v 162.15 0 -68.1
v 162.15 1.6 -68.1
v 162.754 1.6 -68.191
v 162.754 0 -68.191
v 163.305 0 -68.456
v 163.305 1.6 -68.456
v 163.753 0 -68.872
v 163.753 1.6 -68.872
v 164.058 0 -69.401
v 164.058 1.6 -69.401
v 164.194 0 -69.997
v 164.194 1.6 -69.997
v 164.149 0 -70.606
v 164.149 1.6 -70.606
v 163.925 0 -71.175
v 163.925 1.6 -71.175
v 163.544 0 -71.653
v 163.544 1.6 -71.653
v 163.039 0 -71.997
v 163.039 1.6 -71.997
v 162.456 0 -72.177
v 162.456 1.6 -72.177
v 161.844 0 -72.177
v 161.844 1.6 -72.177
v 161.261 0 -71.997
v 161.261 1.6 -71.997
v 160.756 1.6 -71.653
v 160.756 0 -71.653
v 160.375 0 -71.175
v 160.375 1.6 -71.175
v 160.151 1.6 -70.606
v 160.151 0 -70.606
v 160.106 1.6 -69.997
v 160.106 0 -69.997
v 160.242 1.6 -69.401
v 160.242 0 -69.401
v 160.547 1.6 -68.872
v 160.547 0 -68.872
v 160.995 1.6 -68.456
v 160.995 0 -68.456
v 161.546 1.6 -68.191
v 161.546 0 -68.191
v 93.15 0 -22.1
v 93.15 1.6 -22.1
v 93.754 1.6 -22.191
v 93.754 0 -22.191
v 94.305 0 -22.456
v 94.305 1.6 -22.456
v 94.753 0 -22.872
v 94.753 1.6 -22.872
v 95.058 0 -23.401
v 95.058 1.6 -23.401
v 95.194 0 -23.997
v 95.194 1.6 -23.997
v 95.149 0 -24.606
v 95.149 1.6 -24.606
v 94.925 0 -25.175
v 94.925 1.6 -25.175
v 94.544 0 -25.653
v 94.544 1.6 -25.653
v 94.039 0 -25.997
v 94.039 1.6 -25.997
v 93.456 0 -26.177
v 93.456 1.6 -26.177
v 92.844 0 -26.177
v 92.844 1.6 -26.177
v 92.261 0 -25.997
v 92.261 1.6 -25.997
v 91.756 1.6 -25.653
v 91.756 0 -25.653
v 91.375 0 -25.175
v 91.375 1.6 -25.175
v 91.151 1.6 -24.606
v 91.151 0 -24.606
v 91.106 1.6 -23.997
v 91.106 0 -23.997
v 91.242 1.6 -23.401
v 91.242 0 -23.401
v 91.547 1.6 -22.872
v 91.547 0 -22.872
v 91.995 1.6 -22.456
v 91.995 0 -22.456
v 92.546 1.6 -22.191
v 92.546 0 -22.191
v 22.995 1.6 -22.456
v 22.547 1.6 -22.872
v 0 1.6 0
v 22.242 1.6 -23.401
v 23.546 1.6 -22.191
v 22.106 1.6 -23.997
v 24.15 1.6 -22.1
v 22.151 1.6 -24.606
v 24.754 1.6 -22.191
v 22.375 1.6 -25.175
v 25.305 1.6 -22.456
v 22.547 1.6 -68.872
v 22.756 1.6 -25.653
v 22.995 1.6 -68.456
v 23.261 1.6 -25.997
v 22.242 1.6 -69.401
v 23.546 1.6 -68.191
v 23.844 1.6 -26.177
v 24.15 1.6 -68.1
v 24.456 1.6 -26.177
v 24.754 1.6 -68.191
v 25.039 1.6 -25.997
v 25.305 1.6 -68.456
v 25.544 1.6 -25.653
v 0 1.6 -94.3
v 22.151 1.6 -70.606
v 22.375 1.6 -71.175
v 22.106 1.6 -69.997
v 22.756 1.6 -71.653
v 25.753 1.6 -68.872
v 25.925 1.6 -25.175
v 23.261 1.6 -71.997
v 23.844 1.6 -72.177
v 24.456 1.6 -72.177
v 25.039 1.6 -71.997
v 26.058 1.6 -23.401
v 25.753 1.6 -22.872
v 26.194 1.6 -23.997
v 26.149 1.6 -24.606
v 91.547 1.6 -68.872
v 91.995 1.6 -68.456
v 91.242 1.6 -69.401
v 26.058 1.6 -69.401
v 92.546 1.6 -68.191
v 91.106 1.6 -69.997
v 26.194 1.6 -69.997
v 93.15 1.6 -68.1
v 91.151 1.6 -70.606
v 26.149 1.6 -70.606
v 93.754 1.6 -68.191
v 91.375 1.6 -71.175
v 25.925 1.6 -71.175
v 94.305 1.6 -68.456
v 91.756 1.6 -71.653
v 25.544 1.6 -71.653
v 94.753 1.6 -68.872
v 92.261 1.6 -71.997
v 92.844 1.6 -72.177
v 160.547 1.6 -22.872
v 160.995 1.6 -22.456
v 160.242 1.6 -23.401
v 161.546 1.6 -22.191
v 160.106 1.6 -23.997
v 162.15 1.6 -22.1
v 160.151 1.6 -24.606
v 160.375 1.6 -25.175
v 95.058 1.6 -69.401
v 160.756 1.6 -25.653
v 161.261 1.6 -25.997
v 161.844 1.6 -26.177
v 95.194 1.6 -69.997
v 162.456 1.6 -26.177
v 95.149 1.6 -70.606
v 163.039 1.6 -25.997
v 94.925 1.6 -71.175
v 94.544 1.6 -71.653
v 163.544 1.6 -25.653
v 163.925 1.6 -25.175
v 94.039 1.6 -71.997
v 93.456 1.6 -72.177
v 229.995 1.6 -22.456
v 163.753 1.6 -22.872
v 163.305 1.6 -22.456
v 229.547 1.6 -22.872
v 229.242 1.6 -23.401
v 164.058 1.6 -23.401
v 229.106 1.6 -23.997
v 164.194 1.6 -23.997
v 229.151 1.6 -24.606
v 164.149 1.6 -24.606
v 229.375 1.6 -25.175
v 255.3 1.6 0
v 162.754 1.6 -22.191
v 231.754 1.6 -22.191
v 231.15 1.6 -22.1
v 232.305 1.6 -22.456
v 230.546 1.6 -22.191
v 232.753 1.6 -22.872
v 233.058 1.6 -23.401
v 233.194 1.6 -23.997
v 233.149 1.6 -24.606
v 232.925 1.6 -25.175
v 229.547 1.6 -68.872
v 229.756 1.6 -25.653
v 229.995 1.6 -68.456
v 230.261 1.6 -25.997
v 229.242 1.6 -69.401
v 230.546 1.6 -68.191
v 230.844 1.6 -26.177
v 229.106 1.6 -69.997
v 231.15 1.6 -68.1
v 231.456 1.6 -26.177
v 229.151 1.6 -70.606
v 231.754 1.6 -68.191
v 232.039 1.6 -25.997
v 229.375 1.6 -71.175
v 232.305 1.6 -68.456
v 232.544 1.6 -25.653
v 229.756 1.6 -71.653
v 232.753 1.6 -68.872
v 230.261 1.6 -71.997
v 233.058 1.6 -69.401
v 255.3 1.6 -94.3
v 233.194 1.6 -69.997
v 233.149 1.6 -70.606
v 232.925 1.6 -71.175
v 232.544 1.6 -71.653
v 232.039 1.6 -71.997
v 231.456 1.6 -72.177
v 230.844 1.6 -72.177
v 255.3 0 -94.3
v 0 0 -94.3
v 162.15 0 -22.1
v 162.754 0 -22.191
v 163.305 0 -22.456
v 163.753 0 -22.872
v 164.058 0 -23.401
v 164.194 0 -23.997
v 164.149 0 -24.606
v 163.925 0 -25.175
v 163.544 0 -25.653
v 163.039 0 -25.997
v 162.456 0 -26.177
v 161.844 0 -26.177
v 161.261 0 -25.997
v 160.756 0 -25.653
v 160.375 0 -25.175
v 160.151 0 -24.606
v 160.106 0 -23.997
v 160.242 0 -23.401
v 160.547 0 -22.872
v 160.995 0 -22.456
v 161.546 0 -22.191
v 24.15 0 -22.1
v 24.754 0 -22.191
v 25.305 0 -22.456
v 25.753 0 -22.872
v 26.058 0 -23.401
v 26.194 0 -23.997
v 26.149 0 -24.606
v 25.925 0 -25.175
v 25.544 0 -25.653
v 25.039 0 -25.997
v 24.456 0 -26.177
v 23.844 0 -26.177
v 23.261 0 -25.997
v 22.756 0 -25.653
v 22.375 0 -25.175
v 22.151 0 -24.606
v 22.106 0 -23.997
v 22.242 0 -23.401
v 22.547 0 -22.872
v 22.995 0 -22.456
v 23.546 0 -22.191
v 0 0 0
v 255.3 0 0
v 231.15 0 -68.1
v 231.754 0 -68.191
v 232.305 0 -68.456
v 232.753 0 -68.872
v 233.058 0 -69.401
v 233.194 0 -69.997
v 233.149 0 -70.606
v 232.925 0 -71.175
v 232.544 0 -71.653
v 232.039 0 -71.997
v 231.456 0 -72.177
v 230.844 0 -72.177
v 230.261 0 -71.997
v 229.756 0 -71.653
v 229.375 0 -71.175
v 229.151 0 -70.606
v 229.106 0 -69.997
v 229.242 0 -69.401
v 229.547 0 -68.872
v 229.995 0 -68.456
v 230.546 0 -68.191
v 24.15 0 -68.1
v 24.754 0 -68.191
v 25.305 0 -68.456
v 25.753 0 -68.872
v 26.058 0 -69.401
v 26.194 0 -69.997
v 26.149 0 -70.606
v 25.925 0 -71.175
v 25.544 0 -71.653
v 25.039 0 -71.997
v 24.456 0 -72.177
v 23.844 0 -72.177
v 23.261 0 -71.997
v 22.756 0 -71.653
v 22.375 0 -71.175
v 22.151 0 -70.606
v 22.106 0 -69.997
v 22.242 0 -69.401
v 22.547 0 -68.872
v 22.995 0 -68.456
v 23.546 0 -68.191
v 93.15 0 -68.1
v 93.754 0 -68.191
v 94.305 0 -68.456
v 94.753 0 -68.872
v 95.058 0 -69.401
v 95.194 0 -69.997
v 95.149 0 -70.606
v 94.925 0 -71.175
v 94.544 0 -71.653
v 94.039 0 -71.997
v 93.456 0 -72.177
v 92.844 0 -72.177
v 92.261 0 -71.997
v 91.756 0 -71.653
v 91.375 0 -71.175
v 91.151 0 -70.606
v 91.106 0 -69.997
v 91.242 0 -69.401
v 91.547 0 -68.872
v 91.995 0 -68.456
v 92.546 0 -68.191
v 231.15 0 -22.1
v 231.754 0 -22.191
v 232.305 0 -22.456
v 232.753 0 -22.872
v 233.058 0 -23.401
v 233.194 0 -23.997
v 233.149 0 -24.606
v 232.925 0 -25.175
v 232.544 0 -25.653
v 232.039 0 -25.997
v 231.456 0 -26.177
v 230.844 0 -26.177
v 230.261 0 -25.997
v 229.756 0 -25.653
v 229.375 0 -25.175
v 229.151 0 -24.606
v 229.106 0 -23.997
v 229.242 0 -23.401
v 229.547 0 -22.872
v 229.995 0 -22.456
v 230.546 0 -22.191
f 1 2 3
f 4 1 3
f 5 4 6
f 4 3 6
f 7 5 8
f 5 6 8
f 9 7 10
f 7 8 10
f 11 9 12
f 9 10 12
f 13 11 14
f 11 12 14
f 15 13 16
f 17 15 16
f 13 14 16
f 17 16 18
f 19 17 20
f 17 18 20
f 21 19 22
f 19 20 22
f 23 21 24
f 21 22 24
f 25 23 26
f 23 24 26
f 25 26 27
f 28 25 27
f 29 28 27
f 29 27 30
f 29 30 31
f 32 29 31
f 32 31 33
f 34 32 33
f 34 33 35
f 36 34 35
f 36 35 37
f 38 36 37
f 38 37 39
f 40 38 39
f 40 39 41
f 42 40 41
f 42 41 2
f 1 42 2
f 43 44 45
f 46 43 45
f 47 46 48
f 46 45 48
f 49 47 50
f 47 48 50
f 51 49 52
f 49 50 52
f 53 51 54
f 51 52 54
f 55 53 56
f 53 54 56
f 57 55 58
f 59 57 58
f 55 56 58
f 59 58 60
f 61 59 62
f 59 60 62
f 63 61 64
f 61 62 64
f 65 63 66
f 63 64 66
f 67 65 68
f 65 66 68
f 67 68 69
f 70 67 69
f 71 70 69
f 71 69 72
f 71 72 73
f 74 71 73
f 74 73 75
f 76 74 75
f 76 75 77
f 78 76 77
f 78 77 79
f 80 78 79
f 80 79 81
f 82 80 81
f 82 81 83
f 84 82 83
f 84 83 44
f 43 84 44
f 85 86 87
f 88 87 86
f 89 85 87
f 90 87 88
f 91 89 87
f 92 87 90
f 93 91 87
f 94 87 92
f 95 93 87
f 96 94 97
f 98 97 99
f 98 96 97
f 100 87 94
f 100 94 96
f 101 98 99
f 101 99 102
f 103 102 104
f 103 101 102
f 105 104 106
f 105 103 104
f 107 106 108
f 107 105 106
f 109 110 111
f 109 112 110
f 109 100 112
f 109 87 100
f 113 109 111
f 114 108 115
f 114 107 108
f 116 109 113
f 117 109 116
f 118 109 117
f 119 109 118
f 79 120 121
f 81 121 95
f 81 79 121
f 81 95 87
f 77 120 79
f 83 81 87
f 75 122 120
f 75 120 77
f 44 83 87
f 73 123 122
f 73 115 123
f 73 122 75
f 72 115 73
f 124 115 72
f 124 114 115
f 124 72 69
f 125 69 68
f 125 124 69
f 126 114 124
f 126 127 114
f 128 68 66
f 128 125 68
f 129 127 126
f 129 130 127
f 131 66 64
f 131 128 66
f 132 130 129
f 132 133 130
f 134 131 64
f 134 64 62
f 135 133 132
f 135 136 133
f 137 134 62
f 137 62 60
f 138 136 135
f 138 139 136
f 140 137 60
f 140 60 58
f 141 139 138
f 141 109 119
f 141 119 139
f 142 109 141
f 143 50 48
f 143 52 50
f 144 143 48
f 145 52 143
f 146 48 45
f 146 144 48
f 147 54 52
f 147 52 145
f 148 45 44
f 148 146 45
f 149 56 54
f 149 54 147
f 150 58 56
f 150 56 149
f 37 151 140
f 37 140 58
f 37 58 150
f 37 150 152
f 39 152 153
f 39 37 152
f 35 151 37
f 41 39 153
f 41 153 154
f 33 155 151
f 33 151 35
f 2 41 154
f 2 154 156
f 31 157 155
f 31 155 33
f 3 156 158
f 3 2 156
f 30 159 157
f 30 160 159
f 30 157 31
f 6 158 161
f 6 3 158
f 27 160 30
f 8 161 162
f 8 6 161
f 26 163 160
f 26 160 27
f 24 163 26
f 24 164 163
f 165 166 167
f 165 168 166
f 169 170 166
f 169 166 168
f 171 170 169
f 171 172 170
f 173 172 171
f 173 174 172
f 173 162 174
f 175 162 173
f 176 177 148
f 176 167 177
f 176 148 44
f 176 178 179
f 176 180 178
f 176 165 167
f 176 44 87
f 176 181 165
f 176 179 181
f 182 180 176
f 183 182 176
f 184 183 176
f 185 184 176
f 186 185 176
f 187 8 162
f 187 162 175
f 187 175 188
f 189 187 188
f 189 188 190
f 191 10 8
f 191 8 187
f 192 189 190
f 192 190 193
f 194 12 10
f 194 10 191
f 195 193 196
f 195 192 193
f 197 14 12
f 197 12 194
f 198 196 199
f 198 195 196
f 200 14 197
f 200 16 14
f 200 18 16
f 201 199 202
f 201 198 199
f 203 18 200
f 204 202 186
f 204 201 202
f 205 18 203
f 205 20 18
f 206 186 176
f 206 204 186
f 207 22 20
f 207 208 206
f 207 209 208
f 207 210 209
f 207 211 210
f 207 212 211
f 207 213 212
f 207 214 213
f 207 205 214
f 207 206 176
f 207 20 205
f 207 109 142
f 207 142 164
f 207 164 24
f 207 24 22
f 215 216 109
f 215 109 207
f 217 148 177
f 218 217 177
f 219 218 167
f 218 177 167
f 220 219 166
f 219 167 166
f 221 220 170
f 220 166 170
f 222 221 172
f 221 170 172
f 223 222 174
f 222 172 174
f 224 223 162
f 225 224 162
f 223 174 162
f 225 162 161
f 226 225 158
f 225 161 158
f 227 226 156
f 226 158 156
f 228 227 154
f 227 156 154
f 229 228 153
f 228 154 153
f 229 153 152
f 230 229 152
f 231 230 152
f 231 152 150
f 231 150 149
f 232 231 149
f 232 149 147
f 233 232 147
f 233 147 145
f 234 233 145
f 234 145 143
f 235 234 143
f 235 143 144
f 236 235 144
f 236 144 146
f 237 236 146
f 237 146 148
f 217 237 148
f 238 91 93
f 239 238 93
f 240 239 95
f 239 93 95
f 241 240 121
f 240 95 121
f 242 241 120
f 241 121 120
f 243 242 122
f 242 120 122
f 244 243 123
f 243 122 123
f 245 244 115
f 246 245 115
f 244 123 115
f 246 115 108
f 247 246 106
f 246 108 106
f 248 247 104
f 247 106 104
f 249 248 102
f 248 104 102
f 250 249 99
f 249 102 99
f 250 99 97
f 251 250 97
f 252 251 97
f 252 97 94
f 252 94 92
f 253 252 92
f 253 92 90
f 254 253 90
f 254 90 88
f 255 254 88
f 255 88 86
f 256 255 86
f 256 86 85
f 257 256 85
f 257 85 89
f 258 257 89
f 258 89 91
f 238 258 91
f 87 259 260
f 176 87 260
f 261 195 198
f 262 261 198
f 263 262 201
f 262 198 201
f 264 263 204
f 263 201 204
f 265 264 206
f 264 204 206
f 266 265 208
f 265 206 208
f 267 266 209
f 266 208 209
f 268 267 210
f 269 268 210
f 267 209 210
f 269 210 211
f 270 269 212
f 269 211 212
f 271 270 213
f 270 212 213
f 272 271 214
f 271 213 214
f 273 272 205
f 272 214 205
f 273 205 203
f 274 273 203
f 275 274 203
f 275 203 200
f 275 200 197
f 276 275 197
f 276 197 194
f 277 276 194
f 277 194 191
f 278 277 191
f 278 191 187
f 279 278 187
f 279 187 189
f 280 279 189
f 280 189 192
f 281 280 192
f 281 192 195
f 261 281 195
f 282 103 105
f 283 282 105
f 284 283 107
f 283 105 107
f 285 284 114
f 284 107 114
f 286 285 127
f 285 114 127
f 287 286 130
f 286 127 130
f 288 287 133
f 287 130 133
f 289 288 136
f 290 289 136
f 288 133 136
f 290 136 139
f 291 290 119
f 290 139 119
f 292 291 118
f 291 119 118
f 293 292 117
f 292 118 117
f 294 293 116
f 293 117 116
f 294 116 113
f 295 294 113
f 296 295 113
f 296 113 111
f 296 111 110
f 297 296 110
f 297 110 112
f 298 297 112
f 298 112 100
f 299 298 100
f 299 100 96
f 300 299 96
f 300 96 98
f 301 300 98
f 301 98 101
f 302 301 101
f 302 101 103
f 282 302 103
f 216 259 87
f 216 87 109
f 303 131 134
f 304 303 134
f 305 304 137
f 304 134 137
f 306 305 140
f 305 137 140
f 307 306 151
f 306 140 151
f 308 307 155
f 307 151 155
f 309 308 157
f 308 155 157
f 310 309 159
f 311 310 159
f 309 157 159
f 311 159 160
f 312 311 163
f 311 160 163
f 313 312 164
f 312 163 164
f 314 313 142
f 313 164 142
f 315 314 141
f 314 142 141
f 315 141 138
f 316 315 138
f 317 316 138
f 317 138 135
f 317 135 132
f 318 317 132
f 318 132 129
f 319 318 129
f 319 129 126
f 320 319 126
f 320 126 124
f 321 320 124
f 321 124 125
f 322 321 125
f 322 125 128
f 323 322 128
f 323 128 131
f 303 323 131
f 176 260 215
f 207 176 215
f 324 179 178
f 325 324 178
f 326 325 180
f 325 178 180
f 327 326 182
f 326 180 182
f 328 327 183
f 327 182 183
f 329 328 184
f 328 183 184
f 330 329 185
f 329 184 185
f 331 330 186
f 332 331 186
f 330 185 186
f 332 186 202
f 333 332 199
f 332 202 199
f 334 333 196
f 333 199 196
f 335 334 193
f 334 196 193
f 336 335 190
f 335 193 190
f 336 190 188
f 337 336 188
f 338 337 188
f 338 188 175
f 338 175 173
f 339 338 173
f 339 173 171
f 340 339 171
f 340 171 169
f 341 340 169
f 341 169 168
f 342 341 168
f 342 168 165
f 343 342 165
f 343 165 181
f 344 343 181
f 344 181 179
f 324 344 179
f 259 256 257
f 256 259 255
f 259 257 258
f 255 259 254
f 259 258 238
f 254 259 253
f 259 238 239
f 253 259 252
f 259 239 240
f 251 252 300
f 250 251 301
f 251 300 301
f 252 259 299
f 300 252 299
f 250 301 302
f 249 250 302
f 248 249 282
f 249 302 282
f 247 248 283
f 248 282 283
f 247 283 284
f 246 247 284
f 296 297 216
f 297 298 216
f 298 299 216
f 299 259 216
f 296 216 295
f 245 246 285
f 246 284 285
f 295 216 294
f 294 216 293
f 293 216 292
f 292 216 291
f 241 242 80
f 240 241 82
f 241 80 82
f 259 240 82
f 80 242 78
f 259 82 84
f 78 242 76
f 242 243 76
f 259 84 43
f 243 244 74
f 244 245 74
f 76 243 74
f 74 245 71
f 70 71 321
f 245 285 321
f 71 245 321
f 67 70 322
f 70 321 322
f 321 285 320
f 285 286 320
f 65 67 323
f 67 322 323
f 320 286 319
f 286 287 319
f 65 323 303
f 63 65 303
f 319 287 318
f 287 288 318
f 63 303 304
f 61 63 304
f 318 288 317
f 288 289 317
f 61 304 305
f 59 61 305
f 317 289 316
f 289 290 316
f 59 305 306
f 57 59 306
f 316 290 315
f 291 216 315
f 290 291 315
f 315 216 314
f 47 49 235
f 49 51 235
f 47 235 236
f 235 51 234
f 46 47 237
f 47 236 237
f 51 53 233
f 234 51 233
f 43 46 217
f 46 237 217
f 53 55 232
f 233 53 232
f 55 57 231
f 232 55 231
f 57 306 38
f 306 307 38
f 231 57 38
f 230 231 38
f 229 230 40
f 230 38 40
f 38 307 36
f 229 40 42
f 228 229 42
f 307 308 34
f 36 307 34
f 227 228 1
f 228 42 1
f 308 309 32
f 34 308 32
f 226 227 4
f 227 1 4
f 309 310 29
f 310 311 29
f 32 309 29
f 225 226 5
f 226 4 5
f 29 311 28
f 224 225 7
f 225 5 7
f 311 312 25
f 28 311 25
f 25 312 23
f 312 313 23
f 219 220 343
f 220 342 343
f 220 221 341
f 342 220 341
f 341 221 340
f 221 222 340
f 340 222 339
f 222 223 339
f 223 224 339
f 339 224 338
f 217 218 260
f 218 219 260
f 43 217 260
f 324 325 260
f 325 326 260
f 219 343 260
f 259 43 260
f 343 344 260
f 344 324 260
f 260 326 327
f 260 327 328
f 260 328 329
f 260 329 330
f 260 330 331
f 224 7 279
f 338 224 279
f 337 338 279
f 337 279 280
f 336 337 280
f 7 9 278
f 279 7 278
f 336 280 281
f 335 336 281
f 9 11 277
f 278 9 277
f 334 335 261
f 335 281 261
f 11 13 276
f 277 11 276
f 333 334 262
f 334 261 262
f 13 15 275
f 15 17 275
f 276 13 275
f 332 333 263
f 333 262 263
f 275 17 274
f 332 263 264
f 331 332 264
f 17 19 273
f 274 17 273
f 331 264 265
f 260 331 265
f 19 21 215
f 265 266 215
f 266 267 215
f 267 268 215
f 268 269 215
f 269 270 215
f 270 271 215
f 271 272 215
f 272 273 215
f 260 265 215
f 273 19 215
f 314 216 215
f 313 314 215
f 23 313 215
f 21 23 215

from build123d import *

# Parameters (mm, degrees)
SKETCH1_W           = 255.3
SKETCH1_H           = 94.3
BOSS_EXTRUDE1_DEPTH = 1.6
SKETCH3_R           = 2.05
CUT_EXTRUDE1_DEPTH  = 273.163810967


with BuildPart() as part:
    # Sketch1 → Boss-Extrude1 (new body)
    with BuildSketch(Plane(origin=(0, 0, 0), x_dir=(1, 0, 0), z_dir=(0, 1, 0))):
        with Locations((127.65, 47.15)):
            Rectangle(SKETCH1_W, SKETCH1_H)
    extrude(amount=BOSS_EXTRUDE1_DEPTH)

    # Sketch3 → Cut-Extrude1 (cut, through all)
    with BuildSketch(Plane(origin=(0, 1.6, 0), x_dir=(1, 0, 0), z_dir=(0, 1, 0))):
        with Locations(Location((24.15, 70.15, 0), (0, 0, 270))):
            Circle(SKETCH3_R)
        with Locations(Location((24.15, 24.15, 0), (0, 0, 270))):
            Circle(SKETCH3_R)
        with Locations(Location((93.15, 70.15, 0), (0, 0, 270))):
            Circle(SKETCH3_R)
        with Locations(Location((93.15, 24.15, 0), (0, 0, 270))):
            Circle(SKETCH3_R)
        with Locations(Location((162.15, 24.15, 0), (0, 0, 270))):
            Circle(SKETCH3_R)
        with Locations(Location((162.15, 70.15, 0), (0, 0, 270))):
            Circle(SKETCH3_R)
        with Locations(Location((231.15, 70.15, 0), (0, 0, 270))):
            Circle(SKETCH3_R)
        with Locations(Location((231.15, 24.15, 0), (0, 0, 270))):
            Circle(SKETCH3_R)
    extrude(amount=-CUT_EXTRUDE1_DEPTH, mode=Mode.SUBTRACT)


solid = part.part
